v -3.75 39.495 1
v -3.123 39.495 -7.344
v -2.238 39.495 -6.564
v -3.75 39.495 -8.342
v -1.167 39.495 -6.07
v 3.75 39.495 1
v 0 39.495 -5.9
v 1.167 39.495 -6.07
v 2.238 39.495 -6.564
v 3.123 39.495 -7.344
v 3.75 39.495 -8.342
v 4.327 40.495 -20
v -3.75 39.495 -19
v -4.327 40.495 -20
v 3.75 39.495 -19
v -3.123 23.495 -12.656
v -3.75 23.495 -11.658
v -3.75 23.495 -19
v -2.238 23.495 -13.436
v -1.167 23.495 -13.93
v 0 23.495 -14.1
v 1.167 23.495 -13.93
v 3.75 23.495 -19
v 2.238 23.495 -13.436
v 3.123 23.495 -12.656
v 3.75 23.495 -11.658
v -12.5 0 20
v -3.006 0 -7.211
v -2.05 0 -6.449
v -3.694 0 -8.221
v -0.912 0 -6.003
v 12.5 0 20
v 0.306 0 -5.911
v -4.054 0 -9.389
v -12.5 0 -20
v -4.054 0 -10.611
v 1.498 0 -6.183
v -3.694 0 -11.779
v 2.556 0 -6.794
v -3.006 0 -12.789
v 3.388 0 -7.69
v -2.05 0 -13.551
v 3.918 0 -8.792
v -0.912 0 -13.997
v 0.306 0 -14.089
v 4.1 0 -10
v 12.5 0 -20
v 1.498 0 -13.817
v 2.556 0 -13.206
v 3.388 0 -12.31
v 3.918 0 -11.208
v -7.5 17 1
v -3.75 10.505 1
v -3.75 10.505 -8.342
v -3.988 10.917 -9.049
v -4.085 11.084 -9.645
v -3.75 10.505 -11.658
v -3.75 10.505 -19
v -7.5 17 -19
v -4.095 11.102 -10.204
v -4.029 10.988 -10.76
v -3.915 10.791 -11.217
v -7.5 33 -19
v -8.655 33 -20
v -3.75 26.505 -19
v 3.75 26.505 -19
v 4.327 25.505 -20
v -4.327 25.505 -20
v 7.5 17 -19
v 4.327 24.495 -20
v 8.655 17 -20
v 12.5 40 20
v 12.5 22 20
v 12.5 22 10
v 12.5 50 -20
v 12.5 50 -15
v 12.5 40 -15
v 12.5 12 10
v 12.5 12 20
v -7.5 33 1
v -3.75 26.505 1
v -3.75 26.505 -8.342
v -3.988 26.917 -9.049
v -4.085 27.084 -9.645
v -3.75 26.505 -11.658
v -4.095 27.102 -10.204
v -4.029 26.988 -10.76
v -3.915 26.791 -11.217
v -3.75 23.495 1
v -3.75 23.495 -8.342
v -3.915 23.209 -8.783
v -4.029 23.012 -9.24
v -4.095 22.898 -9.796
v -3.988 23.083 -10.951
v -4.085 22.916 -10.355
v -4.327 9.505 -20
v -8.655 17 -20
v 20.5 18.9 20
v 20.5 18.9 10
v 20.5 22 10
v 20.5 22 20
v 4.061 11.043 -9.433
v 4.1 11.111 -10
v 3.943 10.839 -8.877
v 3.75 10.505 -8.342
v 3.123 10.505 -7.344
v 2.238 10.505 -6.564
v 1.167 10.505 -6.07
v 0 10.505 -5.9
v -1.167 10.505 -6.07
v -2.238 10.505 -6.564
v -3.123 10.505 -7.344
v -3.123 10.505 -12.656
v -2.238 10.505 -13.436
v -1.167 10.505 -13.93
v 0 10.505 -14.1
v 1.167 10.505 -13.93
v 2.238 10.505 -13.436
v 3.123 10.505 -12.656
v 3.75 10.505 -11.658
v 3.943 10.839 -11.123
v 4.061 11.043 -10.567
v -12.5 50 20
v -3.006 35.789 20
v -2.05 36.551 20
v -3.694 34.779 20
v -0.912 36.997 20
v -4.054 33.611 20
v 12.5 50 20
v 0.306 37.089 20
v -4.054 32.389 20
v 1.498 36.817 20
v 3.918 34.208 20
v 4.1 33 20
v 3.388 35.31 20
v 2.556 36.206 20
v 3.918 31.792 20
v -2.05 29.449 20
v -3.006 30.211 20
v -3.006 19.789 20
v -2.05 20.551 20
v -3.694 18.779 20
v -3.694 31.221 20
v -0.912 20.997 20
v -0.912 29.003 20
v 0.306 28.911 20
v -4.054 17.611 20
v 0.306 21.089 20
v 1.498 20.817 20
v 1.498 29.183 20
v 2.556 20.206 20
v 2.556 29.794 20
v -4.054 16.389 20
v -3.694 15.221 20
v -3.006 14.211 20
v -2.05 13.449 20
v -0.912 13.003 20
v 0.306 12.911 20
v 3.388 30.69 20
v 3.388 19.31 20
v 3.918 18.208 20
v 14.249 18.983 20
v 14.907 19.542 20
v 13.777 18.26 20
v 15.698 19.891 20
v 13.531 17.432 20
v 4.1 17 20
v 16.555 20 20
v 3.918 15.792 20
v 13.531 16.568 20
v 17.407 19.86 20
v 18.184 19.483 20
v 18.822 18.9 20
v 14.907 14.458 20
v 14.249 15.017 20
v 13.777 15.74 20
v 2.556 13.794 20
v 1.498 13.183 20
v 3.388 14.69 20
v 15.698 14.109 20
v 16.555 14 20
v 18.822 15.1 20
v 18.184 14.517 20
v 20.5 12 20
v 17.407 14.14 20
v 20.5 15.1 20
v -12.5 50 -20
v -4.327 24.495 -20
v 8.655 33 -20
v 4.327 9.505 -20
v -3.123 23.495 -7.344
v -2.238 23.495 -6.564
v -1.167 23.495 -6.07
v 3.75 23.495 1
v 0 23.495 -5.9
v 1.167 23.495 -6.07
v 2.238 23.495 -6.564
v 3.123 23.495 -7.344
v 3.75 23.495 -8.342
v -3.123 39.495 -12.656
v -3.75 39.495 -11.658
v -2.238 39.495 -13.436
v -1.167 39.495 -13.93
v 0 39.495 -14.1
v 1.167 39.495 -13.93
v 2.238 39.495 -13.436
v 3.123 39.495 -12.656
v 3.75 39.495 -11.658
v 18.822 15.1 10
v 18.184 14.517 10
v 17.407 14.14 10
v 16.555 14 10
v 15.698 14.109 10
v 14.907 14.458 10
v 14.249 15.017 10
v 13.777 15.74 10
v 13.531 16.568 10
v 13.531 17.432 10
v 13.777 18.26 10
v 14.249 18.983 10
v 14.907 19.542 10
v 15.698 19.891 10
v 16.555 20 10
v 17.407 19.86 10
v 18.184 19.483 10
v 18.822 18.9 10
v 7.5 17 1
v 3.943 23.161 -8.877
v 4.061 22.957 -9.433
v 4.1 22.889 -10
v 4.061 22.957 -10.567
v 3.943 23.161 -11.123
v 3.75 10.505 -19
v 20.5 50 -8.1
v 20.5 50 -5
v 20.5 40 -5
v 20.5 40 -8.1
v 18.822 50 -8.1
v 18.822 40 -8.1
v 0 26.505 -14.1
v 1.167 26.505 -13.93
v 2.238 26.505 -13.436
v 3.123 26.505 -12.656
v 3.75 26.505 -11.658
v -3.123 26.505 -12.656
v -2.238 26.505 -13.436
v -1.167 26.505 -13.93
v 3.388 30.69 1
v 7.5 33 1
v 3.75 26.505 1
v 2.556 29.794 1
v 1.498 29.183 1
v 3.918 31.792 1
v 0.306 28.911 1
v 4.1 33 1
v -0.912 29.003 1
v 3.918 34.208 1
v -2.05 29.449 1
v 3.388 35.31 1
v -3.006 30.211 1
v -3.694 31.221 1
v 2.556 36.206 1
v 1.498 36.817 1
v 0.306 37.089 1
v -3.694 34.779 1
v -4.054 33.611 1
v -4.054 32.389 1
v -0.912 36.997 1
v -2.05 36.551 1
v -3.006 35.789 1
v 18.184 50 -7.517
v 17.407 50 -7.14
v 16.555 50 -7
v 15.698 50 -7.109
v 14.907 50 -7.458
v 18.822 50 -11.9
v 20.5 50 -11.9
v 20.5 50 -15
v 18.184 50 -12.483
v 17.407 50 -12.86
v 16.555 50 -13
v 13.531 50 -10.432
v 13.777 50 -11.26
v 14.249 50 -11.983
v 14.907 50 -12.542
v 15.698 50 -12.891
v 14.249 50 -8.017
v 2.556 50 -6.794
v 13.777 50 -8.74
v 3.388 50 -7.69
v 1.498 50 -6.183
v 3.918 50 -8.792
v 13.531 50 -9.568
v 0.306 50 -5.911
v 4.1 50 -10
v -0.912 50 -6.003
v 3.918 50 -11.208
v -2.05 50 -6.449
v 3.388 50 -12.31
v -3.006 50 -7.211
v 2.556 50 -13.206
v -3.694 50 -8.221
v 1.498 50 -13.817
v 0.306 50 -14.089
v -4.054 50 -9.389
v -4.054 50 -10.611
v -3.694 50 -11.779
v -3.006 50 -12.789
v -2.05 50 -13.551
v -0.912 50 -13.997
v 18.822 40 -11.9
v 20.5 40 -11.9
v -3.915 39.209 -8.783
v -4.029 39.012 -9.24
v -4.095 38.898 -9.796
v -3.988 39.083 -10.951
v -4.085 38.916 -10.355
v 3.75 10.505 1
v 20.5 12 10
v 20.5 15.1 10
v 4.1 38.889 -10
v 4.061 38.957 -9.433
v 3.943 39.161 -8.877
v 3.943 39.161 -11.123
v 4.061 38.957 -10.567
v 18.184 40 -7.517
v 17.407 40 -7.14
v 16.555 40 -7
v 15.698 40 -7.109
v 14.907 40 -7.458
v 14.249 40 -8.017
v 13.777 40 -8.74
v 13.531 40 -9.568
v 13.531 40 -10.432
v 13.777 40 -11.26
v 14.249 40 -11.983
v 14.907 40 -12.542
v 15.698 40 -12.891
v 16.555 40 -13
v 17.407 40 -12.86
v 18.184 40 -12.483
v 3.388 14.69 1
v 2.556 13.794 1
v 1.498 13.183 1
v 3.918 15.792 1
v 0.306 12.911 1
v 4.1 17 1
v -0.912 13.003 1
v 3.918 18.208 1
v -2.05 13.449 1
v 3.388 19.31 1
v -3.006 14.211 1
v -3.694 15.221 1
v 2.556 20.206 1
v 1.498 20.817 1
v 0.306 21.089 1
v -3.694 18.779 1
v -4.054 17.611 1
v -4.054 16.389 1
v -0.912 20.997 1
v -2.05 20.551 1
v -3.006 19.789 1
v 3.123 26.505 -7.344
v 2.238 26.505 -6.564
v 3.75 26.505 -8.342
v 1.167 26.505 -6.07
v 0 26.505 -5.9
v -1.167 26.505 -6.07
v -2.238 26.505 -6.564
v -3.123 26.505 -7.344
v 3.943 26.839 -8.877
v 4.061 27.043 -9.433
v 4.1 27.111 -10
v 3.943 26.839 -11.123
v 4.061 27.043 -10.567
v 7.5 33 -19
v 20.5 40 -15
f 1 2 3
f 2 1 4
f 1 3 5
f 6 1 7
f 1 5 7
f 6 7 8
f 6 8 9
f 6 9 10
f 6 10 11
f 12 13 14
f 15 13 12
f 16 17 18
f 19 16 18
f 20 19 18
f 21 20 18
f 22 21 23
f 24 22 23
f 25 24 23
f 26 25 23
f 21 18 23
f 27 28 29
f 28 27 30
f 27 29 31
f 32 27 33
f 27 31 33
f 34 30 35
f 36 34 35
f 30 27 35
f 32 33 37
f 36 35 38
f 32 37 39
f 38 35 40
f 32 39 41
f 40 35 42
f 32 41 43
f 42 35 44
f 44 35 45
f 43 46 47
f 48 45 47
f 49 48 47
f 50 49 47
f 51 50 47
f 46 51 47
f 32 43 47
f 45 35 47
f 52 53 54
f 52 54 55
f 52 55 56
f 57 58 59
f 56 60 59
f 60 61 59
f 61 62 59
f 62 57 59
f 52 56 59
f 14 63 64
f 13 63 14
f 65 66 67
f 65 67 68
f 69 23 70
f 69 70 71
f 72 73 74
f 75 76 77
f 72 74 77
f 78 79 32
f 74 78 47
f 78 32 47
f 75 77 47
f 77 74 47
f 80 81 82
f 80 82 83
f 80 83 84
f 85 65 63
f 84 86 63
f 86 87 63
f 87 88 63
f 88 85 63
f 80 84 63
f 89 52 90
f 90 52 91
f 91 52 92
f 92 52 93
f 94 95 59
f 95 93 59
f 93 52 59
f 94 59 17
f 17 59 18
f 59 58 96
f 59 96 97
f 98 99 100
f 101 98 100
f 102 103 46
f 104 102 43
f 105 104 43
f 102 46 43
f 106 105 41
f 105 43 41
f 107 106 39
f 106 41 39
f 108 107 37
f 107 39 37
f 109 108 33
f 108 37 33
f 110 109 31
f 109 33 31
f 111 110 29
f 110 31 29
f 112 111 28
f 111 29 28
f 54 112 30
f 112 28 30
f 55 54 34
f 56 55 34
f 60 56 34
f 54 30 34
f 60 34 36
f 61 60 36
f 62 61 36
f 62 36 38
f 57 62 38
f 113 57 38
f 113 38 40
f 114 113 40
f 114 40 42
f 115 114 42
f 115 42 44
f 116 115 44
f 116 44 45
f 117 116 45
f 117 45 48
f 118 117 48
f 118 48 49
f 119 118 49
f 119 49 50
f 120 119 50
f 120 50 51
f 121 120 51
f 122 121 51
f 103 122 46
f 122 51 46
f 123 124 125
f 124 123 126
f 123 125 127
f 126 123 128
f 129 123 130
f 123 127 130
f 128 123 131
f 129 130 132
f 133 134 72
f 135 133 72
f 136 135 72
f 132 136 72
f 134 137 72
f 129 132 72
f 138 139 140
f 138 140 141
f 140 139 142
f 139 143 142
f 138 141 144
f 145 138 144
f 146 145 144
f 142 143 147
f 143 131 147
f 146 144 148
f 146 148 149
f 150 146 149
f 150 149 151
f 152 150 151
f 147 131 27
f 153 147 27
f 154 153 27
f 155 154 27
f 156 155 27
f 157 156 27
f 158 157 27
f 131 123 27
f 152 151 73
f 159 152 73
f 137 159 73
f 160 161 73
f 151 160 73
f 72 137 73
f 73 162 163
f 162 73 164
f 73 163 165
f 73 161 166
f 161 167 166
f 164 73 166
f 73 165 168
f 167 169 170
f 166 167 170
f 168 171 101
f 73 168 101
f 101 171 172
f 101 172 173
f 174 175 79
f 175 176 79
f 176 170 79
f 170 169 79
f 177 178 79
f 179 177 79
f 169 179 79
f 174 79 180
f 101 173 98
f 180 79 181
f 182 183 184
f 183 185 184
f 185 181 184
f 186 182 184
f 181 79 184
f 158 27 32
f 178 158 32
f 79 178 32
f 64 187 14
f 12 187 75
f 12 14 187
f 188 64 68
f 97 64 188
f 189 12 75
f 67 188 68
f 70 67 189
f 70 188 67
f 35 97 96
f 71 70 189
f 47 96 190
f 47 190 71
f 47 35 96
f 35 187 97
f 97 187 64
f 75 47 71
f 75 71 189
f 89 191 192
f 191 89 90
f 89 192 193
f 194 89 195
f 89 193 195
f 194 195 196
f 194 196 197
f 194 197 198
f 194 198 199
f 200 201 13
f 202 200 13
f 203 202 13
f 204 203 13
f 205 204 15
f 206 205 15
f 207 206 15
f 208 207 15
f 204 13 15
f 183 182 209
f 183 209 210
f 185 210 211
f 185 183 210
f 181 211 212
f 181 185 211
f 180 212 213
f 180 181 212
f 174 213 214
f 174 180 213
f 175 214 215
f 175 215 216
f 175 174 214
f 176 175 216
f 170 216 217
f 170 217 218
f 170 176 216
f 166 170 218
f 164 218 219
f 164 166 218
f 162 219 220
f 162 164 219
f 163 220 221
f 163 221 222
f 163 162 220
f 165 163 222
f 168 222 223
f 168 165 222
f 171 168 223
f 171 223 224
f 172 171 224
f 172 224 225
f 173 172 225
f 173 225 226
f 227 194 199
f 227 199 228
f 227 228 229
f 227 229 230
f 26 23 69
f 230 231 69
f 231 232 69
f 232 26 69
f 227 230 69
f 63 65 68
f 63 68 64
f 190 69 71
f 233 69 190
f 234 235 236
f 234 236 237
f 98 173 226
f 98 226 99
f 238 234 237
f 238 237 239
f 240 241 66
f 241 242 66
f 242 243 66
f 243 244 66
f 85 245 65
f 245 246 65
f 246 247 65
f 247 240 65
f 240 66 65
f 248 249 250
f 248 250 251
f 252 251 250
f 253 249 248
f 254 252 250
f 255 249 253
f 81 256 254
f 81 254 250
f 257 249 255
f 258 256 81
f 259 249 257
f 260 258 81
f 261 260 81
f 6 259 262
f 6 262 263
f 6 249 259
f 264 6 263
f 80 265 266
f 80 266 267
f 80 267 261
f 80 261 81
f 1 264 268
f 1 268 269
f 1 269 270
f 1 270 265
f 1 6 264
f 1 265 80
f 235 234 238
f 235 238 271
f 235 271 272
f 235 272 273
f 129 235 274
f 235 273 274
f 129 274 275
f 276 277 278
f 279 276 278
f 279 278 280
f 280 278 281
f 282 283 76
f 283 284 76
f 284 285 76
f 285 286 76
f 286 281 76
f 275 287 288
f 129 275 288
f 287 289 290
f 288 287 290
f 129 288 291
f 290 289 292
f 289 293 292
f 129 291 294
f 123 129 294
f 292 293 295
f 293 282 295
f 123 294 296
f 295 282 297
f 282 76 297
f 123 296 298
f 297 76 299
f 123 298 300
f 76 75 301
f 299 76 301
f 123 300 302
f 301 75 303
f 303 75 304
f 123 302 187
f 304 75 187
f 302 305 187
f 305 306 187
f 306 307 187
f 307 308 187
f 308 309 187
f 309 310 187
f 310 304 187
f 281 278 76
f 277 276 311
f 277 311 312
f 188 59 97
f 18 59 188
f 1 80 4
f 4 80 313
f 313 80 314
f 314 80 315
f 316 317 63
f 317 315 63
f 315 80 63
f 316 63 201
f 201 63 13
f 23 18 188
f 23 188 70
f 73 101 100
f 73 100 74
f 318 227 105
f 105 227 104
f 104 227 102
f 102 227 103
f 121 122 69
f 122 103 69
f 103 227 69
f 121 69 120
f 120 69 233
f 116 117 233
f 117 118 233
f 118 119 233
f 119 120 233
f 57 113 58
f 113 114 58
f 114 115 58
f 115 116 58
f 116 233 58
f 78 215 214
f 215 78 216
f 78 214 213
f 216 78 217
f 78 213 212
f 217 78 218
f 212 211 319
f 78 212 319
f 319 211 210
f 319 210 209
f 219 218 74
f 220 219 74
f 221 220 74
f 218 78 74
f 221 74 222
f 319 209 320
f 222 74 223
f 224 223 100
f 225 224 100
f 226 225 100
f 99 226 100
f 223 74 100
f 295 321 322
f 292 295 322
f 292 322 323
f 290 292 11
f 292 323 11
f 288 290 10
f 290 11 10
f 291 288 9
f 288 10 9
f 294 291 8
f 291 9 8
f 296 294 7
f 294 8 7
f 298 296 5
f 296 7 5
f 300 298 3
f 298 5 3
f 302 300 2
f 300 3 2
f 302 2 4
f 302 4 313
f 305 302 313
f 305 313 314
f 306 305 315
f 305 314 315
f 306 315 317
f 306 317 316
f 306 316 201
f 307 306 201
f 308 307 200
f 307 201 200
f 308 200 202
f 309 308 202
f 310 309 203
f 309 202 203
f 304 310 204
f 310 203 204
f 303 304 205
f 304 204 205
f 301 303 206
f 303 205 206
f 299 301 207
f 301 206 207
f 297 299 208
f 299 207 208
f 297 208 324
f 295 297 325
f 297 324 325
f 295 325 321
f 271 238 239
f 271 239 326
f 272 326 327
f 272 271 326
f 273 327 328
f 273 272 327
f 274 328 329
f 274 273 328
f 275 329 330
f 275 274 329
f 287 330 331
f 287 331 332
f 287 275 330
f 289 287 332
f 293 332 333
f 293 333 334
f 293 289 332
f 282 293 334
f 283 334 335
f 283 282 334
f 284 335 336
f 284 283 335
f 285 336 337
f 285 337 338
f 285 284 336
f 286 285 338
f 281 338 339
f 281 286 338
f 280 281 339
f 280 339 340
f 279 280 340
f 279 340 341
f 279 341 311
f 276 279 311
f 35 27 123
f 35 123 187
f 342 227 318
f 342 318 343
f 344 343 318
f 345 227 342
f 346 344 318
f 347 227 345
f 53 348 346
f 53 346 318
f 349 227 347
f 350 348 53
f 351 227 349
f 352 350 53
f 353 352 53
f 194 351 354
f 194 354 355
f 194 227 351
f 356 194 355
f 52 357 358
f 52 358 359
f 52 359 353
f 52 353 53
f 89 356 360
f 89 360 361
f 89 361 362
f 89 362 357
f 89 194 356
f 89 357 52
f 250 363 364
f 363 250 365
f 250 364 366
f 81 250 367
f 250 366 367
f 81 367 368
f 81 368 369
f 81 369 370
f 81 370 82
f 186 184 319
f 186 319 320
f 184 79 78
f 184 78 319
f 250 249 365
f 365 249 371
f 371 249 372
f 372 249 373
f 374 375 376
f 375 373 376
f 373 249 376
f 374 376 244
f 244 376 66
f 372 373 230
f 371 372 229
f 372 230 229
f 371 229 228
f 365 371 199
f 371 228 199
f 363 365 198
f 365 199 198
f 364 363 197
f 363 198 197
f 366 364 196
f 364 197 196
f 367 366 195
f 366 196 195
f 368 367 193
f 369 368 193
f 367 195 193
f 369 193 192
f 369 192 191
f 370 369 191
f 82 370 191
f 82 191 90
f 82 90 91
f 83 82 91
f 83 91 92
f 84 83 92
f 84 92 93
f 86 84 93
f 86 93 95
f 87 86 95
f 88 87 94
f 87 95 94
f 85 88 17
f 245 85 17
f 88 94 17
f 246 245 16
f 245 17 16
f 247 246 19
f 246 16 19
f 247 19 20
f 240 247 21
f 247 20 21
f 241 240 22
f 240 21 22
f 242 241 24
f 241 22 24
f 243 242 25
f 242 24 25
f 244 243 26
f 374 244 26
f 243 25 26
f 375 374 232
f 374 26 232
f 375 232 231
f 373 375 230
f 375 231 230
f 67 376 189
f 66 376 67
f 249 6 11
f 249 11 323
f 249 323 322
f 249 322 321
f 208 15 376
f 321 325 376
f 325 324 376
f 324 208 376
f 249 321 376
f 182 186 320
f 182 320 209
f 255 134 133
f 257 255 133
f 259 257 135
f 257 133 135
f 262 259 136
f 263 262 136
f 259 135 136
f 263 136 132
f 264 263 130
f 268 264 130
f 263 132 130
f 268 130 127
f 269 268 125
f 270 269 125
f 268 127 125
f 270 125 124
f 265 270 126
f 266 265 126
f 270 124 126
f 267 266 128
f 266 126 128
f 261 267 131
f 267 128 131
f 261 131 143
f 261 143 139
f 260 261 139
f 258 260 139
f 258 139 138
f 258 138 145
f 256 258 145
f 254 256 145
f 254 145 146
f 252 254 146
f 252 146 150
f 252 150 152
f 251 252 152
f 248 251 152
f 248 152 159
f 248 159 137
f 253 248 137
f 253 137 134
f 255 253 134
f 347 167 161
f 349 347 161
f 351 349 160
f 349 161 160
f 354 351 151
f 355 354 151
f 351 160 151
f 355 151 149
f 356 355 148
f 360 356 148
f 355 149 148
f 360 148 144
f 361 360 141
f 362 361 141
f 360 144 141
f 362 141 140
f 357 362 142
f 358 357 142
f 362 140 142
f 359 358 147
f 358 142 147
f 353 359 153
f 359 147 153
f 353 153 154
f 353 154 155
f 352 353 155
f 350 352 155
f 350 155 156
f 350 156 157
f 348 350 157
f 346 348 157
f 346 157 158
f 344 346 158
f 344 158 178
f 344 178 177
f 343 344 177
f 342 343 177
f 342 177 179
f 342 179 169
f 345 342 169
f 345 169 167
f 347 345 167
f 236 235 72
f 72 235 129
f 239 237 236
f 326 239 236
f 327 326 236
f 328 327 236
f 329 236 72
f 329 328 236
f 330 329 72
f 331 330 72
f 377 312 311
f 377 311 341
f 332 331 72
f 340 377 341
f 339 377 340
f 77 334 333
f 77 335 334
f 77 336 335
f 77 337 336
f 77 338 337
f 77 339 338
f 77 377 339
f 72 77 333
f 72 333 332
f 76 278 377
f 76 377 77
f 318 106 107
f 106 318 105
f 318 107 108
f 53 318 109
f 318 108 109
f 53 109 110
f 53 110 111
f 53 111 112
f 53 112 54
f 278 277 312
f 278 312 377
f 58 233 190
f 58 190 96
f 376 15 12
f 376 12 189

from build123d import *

# Parameters (mm, degrees)
SKETCH1_W           = 25
SKETCH1_H           = 40
BOSS_EXTRUDE1_DEPTH = 50
SKETCH2_R           = 4.1
CUT_EXTRUDE1_DEPTH  = 51
SKETCH3_R           = 4.1
CUT_EXTRUDE2_DEPTH  = 41
CUT_EXTRUDE3_DEPTH  = 21
BOSS_EXTRUDE2_DEPTH = 10
BOSS_EXTRUDE3_DEPTH = 10
CHAMFER1_SIZE       = 1
BOSS_EXTRUDE4_DEPTH = 10


with BuildPart() as part:
    # Sketch1 → Boss-Extrude1 (new body)
    with BuildSketch(Plane(origin=(0, 0, 0), x_dir=(1, 0, 0), z_dir=(0, 1, 0))):
        Rectangle(SKETCH1_W, SKETCH1_H)
    extrude(amount=BOSS_EXTRUDE1_DEPTH)

    # Sketch2 → Cut-Extrude1 (cut, through all)
    with BuildSketch(Plane.XZ):
        with Locations((0, -10)):
            Circle(SKETCH2_R)
    extrude(amount=-CUT_EXTRUDE1_DEPTH, mode=Mode.SUBTRACT)

    # Sketch3 → Cut-Extrude2 (cut, through all)
    with BuildSketch(Plane.XY.offset(20)):
        with Locations((0, 17)):
            Circle(SKETCH3_R)
        with Locations((0, 33)):
            Circle(SKETCH3_R)
    extrude(amount=-CUT_EXTRUDE2_DEPTH, mode=Mode.SUBTRACT)

    # Sketch4 → Cut-Extrude3 (cut)
    with BuildSketch(Plane(origin=(0, 0, -20), x_dir=(-1, 0, 0), z_dir=(0, 0, -1))):
        Polygon((-7.5, 17), (-3.75, 10.504809472), (3.75, 10.504809472), (7.5, 17), (3.75, 23.495190528), (-3.75, 23.495190528), align=None)
        Polygon((3.75, 39.495190528), (-3.75, 39.495190528), (-7.5, 33), (-3.75, 26.504809472), (3.75, 26.504809472), (7.5, 33), align=None)
    extrude(amount=-CUT_EXTRUDE3_DEPTH, mode=Mode.SUBTRACT)

    # Sketch5 → Boss-Extrude2 (add)
    with BuildSketch(Plane(origin=(0, 50, 0), x_dir=(1, 0, 0), z_dir=(0, 1, 0))):
        with BuildLine():
            Line((12.5, 5), (20.5, 5))
            Line((20.5, 5), (20.5, 8.1))
            Line((20.5, 8.1), (18.821637353, 8.1))
            ThreePointArc((18.821637353, 8.1), (13.5, 10), (18.821637353, 11.9))
            Line((18.821637353, 11.9), (20.5, 11.9))
            Line((20.5, 11.9), (20.5, 15))
            Line((20.5, 15), (12.5, 15))
            Line((12.5, 15), (12.5, 5))
        make_face()
    extrude(amount=-BOSS_EXTRUDE2_DEPTH)

    # Sketch6 → Boss-Extrude3 (add)
    with BuildSketch(Plane.XY.offset(20)):
        with BuildLine():
            Line((12.5, 12), (20.5, 12))
            Line((20.5, 12), (20.5, 15.1))
            Line((20.5, 15.1), (18.821637353, 15.1))
            ThreePointArc((18.821637353, 15.1), (13.5, 17), (18.821637353, 18.9))
            Line((18.821637353, 18.9), (20.5, 18.9))
            Line((20.5, 18.9), (20.5, 22))
            Line((20.5, 22), (12.5, 22))
            Line((12.5, 22), (12.5, 12))
        make_face()
    extrude(amount=-BOSS_EXTRUDE3_DEPTH)

    # Chamfer1
    chamfer1_edges = [part.edges().sort_by_distance(p)[0] for p in [
        (5.625, 20.247595264, -20),
        (5.625, 13.752404736, -20),
        (0, 10.504809472, -20),
        (-5.625, 13.752404736, -20),
        (-5.625, 20.247595264, -20),
        (0, 23.495190528, -20),
        (-5.625, 36.247595264, -20),
        (0, 39.495190528, -20),
        (5.625, 36.247595264, -20),
        (5.625, 29.752404736, -20),
        (0, 26.504809472, -20),
        (-5.625, 29.752404736, -20),
    ]]
    chamfer(chamfer1_edges, length=CHAMFER1_SIZE)

    # Sketch7 → Boss-Extrude4 (add)
    with BuildSketch(Plane(origin=(0, 50, 0), x_dir=(1, 0, 0), z_dir=(0, 1, 0))):
        Polygon((20.5, 5), (12.5, -20), (12.5, 5), align=None)
    extrude(amount=-BOSS_EXTRUDE4_DEPTH)


solid = part.part
